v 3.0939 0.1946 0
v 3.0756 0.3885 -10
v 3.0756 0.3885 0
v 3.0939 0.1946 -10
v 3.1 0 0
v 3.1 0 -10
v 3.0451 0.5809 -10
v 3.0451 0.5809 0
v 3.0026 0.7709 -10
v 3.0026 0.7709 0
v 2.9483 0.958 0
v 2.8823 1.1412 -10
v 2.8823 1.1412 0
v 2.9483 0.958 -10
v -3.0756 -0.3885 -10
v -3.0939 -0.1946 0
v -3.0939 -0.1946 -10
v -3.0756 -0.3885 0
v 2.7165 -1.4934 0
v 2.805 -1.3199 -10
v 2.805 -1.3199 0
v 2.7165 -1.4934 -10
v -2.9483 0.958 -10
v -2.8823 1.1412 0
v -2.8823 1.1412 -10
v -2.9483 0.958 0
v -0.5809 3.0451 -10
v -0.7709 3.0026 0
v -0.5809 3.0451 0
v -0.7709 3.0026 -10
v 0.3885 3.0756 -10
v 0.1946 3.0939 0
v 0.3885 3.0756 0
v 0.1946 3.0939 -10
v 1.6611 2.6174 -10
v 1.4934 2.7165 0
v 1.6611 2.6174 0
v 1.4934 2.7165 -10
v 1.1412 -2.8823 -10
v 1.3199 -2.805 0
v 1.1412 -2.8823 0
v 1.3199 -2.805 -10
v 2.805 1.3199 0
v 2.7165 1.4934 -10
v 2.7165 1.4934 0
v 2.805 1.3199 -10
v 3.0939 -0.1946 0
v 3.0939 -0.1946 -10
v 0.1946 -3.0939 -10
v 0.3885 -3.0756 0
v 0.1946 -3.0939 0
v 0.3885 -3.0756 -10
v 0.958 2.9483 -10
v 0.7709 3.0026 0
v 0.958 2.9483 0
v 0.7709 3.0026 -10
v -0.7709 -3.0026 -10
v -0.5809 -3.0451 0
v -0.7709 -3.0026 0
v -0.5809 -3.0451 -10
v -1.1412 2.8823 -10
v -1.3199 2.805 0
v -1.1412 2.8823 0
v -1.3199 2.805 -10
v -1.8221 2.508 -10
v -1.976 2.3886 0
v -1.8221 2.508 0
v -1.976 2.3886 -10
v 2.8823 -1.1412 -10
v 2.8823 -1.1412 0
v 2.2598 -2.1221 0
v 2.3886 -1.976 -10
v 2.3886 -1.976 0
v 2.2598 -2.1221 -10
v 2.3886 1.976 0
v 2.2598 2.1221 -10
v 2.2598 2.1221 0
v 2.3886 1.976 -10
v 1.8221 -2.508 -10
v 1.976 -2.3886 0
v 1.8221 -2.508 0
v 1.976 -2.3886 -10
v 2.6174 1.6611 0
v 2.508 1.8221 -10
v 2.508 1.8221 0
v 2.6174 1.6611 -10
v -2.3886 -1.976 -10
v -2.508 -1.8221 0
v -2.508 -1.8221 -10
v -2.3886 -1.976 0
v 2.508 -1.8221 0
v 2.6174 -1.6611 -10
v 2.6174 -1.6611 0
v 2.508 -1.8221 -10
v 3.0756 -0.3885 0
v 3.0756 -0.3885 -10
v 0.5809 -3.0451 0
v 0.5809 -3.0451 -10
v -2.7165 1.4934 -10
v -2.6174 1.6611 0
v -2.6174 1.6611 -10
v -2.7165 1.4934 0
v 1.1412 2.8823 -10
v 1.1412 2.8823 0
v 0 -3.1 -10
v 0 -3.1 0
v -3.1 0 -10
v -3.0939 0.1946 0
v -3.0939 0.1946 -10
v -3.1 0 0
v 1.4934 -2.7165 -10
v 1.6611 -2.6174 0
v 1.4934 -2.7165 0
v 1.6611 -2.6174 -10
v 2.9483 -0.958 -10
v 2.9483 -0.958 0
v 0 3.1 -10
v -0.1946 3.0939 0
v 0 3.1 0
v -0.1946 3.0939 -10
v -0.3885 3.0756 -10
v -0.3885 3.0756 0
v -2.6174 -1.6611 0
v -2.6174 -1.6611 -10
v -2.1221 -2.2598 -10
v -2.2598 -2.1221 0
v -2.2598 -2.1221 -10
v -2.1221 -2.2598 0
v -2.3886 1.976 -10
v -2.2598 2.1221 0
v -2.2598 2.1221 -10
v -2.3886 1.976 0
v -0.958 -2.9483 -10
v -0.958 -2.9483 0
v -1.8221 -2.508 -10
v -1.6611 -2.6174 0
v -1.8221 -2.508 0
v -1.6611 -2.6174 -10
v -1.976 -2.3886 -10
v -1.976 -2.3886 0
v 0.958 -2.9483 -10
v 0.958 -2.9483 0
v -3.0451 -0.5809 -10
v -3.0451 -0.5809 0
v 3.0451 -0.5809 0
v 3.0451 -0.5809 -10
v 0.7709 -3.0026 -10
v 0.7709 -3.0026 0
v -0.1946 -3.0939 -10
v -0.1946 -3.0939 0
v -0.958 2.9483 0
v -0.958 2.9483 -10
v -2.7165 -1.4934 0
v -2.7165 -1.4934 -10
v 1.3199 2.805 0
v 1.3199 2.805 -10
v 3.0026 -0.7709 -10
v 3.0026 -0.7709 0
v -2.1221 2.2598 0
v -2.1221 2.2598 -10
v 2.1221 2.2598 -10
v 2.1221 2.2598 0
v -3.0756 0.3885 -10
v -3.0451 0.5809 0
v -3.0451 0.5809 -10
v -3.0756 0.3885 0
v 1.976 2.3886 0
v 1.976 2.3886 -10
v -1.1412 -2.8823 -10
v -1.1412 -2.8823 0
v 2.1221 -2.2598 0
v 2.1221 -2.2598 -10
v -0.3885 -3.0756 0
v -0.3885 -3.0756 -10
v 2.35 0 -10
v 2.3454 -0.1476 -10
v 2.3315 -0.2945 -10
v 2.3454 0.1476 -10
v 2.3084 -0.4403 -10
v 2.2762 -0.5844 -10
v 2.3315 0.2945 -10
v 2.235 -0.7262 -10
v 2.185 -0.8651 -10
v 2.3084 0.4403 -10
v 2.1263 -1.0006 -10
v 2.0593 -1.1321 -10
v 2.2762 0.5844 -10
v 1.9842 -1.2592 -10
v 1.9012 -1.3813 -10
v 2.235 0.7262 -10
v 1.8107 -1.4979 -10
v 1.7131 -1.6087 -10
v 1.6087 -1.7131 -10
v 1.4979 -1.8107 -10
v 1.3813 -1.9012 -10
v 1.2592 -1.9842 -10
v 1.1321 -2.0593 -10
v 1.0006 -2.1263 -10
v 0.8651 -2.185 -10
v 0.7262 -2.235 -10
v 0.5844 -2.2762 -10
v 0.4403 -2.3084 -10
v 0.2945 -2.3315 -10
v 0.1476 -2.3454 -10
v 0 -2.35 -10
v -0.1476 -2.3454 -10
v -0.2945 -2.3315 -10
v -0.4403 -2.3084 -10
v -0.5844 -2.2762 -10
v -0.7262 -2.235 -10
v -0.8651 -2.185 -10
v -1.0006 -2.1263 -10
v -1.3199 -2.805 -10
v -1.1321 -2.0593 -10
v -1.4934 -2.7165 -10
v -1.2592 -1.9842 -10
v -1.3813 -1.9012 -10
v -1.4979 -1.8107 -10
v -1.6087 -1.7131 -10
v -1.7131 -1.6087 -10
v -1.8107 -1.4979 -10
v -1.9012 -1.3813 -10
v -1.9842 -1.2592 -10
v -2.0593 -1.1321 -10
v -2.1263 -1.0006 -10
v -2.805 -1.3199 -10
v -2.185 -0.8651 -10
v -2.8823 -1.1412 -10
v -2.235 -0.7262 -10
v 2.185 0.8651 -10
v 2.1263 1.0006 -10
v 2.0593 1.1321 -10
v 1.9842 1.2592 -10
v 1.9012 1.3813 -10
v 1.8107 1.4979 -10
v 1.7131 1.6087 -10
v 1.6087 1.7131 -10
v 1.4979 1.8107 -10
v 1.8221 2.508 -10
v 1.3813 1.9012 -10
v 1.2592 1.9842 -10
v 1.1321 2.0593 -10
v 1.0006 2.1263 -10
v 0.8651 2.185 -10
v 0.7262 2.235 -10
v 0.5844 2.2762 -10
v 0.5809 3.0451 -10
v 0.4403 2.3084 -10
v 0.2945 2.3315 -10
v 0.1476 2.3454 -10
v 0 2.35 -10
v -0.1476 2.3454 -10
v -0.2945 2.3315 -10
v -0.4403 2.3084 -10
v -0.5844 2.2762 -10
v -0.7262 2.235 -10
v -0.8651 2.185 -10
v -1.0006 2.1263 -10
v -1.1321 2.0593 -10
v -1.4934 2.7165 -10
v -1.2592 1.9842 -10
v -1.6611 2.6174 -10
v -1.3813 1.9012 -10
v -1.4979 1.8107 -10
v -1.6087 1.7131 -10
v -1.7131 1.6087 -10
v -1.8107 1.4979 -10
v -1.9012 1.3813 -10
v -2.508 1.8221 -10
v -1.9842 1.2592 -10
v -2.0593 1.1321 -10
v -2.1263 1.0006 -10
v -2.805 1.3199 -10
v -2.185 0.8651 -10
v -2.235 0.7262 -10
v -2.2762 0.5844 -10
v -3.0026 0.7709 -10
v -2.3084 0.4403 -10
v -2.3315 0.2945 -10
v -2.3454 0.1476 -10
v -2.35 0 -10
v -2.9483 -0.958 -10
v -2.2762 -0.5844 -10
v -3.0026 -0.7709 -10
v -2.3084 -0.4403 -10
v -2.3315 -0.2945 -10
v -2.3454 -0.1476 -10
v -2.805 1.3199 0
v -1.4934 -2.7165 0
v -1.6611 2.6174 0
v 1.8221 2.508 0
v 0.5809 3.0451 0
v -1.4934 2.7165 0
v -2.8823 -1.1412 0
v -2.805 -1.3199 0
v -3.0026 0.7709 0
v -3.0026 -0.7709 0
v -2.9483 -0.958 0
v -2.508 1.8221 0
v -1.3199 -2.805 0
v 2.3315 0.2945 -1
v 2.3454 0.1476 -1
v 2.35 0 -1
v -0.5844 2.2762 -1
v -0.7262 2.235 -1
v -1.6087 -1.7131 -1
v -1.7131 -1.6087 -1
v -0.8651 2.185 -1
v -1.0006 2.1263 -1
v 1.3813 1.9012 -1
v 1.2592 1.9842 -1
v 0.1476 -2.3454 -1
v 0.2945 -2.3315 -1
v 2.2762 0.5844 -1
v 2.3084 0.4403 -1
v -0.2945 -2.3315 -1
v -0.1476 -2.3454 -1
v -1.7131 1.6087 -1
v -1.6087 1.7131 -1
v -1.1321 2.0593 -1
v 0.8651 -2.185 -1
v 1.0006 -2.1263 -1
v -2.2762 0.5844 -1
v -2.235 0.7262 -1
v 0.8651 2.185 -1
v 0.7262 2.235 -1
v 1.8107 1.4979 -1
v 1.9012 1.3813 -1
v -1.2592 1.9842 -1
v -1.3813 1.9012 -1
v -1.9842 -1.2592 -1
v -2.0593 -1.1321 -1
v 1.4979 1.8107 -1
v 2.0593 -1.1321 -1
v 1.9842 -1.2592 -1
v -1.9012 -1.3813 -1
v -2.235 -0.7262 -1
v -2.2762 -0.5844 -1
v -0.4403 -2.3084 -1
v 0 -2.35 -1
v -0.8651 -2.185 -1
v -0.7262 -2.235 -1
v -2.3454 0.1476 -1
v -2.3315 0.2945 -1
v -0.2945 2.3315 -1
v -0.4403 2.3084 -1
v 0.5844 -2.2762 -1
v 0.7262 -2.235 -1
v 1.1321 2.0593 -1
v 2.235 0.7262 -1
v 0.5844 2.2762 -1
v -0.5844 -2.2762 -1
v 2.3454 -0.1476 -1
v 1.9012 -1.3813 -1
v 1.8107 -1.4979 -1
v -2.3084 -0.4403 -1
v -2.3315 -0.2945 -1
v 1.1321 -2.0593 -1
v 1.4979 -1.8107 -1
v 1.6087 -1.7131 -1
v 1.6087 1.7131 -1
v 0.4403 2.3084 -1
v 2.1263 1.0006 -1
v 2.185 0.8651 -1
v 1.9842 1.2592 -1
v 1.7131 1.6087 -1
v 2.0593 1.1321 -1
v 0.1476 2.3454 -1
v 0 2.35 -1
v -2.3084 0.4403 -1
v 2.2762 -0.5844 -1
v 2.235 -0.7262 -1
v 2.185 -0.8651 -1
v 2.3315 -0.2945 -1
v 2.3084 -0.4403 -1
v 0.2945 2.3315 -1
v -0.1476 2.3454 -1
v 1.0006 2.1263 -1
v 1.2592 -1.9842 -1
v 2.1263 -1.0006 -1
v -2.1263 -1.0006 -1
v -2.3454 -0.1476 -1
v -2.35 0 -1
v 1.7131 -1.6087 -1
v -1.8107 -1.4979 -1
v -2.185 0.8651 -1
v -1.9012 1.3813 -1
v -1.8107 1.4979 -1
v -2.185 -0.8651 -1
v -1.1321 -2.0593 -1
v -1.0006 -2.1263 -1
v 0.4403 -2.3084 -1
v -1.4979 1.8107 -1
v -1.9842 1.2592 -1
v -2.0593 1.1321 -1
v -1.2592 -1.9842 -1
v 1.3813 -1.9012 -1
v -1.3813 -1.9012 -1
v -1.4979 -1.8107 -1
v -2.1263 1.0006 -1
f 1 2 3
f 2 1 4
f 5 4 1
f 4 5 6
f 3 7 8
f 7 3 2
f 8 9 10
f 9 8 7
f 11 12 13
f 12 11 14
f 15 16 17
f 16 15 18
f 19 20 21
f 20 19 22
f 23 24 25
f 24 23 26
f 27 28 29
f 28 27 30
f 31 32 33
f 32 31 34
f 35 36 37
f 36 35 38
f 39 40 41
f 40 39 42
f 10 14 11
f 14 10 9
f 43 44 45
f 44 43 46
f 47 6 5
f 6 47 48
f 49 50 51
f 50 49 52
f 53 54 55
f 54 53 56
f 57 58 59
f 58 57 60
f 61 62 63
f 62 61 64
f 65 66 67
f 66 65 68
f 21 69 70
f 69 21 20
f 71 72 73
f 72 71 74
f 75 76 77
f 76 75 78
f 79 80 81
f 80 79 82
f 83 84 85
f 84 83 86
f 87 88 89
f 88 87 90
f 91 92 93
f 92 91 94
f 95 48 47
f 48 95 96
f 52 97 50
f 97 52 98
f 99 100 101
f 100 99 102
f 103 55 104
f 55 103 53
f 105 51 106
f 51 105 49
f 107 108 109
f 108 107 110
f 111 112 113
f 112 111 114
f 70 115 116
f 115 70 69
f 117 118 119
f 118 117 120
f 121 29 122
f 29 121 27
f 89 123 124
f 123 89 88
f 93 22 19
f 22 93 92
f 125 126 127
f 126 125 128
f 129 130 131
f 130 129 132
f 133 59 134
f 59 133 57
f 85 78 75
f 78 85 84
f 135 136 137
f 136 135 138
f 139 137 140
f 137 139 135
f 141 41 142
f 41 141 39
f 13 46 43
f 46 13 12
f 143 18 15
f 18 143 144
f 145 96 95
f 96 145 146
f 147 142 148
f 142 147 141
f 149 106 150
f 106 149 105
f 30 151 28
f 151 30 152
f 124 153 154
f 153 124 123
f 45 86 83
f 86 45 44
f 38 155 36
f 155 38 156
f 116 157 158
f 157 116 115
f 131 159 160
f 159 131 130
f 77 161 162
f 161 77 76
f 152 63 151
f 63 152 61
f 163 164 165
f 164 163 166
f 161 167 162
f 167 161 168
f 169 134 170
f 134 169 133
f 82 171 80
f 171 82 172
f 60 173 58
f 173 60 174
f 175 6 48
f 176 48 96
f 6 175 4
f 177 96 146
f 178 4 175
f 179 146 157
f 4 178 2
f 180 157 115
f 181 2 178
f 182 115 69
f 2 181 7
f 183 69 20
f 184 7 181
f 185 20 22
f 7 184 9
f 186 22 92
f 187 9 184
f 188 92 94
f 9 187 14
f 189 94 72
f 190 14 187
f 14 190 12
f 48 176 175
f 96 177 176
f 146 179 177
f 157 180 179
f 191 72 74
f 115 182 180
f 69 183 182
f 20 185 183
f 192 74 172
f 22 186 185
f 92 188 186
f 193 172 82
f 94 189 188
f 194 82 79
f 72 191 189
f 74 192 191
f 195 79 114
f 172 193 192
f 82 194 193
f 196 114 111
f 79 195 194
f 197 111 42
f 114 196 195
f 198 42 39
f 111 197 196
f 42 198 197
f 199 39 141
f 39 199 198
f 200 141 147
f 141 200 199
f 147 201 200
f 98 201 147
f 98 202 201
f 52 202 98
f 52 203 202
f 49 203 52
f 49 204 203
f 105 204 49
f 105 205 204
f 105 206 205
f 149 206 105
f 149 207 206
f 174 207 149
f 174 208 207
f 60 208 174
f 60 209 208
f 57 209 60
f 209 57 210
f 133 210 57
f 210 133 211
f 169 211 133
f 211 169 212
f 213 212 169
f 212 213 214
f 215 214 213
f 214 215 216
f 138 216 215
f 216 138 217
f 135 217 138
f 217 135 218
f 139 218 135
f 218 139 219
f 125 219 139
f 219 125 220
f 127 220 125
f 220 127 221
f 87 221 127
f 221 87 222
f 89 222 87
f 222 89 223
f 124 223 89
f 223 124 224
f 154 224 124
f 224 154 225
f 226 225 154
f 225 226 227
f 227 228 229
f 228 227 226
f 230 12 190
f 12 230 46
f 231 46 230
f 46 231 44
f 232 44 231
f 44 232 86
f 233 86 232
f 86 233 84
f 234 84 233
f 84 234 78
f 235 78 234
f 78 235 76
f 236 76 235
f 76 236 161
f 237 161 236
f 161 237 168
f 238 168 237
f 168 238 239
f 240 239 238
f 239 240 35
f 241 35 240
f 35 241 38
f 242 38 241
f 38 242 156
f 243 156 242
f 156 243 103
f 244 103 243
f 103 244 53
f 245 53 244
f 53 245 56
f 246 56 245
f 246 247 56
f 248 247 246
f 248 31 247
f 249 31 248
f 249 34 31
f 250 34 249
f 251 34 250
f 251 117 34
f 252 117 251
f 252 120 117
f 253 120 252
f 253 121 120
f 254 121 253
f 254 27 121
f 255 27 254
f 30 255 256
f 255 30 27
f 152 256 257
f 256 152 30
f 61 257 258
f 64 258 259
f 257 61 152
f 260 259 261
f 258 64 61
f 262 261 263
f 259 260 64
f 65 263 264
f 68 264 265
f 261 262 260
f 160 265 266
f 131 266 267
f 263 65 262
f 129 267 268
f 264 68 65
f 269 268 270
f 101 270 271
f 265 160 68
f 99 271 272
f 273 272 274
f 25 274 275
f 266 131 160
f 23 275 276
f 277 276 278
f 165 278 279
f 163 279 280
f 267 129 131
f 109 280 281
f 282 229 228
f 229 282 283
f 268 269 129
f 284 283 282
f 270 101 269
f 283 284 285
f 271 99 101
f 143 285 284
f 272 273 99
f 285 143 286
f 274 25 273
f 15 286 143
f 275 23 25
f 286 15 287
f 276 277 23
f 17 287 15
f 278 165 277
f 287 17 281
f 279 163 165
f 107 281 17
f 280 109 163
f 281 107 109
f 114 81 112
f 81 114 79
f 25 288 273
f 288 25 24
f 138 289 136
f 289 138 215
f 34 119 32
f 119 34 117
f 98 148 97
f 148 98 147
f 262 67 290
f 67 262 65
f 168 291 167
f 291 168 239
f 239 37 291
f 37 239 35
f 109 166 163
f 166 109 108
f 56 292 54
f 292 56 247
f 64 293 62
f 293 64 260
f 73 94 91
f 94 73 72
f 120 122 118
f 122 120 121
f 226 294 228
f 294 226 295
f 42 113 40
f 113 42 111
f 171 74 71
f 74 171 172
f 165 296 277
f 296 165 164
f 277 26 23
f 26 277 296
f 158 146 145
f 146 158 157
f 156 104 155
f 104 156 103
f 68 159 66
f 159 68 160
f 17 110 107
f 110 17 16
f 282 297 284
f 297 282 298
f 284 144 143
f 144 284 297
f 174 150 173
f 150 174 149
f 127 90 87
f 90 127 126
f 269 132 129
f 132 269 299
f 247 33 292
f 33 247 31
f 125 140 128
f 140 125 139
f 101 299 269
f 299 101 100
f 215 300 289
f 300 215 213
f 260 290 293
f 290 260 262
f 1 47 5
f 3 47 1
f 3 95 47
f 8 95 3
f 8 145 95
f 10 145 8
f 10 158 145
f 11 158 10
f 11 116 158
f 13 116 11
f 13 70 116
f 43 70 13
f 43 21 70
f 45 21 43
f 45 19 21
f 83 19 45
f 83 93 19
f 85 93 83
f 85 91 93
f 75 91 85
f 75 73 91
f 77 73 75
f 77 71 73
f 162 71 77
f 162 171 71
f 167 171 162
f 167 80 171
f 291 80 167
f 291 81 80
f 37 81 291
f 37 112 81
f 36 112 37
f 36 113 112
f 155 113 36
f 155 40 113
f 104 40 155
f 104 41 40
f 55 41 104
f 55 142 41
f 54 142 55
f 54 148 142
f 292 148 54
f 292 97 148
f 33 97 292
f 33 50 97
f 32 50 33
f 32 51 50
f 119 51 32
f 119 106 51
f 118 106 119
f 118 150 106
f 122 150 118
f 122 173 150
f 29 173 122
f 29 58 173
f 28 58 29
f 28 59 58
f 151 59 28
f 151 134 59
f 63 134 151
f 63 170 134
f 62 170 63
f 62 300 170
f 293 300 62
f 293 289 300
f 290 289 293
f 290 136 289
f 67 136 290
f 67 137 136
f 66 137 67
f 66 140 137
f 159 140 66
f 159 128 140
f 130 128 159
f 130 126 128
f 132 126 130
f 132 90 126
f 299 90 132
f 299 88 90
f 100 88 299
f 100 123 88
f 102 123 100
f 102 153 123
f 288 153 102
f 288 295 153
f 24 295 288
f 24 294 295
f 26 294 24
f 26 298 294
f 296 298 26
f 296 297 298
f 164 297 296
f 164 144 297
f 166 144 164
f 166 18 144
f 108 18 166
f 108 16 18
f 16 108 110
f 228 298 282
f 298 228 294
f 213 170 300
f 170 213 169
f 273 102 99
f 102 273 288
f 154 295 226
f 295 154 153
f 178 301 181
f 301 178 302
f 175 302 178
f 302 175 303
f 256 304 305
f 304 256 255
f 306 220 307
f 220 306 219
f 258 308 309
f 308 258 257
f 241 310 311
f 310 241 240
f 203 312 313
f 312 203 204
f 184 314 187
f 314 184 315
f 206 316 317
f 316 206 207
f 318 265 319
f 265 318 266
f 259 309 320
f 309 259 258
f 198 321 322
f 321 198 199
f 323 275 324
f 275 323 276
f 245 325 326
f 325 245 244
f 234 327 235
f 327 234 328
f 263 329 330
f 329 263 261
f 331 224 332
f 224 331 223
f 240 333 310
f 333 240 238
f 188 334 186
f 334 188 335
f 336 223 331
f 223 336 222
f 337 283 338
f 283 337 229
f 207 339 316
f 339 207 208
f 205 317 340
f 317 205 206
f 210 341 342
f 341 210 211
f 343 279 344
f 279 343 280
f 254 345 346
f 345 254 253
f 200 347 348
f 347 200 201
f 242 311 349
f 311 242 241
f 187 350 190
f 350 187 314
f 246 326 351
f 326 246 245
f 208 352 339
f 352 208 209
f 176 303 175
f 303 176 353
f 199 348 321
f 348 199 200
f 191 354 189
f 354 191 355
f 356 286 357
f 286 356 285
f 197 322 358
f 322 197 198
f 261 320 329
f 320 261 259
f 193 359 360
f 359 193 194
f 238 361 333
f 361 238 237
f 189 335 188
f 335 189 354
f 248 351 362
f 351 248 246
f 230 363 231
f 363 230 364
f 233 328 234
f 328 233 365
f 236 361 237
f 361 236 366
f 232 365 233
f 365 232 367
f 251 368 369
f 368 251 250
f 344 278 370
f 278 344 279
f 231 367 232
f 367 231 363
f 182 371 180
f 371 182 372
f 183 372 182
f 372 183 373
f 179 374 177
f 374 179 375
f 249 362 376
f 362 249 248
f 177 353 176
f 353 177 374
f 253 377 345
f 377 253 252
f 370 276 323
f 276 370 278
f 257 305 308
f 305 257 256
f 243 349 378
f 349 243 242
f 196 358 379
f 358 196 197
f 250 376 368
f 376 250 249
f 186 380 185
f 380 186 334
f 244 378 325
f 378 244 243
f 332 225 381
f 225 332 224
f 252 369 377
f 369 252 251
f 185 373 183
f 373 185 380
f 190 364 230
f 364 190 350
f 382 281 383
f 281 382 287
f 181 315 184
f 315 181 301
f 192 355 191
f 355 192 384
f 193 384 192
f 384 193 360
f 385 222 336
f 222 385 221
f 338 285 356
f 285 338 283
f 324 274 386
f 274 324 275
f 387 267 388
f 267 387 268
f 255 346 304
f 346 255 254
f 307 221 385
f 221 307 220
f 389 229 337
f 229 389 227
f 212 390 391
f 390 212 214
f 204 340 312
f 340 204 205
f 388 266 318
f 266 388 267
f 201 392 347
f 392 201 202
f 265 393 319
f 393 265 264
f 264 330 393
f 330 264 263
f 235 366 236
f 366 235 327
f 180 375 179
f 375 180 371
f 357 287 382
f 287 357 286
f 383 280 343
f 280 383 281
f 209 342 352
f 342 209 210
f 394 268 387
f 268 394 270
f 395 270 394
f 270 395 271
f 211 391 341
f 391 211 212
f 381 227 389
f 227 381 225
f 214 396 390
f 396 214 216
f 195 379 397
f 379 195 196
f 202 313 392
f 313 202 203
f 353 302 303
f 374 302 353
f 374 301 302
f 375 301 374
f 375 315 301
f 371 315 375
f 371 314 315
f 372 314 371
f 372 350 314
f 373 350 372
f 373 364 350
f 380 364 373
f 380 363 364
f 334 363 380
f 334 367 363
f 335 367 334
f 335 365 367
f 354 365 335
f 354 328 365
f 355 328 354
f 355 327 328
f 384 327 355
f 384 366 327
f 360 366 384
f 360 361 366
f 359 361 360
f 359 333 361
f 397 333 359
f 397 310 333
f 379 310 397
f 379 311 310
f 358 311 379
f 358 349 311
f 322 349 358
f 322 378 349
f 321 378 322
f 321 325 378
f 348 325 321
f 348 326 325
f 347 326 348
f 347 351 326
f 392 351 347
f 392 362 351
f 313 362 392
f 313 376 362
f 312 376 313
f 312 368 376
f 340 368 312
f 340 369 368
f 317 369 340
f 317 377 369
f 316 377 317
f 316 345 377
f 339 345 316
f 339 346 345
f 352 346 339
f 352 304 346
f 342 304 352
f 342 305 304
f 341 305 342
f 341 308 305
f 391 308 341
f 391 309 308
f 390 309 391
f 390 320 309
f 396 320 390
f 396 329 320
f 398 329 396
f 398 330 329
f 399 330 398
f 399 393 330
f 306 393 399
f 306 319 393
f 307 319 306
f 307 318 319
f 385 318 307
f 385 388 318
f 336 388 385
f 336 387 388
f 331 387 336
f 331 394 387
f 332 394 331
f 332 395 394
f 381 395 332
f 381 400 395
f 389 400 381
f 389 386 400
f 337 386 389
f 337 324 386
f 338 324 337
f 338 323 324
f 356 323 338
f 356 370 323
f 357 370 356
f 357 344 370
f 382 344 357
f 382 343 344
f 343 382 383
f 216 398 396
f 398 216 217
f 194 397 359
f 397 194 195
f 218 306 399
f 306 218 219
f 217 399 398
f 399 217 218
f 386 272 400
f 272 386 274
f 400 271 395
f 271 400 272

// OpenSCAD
$fn=100;

module pin(diameter=6.2, height=10, cap_depth=1)
{
    translate([0,0,-height]) difference(){
        cylinder(d=diameter,h=height);
        cylinder(d=diameter-1.5,h=height-cap_depth);
    }
}

pin();
